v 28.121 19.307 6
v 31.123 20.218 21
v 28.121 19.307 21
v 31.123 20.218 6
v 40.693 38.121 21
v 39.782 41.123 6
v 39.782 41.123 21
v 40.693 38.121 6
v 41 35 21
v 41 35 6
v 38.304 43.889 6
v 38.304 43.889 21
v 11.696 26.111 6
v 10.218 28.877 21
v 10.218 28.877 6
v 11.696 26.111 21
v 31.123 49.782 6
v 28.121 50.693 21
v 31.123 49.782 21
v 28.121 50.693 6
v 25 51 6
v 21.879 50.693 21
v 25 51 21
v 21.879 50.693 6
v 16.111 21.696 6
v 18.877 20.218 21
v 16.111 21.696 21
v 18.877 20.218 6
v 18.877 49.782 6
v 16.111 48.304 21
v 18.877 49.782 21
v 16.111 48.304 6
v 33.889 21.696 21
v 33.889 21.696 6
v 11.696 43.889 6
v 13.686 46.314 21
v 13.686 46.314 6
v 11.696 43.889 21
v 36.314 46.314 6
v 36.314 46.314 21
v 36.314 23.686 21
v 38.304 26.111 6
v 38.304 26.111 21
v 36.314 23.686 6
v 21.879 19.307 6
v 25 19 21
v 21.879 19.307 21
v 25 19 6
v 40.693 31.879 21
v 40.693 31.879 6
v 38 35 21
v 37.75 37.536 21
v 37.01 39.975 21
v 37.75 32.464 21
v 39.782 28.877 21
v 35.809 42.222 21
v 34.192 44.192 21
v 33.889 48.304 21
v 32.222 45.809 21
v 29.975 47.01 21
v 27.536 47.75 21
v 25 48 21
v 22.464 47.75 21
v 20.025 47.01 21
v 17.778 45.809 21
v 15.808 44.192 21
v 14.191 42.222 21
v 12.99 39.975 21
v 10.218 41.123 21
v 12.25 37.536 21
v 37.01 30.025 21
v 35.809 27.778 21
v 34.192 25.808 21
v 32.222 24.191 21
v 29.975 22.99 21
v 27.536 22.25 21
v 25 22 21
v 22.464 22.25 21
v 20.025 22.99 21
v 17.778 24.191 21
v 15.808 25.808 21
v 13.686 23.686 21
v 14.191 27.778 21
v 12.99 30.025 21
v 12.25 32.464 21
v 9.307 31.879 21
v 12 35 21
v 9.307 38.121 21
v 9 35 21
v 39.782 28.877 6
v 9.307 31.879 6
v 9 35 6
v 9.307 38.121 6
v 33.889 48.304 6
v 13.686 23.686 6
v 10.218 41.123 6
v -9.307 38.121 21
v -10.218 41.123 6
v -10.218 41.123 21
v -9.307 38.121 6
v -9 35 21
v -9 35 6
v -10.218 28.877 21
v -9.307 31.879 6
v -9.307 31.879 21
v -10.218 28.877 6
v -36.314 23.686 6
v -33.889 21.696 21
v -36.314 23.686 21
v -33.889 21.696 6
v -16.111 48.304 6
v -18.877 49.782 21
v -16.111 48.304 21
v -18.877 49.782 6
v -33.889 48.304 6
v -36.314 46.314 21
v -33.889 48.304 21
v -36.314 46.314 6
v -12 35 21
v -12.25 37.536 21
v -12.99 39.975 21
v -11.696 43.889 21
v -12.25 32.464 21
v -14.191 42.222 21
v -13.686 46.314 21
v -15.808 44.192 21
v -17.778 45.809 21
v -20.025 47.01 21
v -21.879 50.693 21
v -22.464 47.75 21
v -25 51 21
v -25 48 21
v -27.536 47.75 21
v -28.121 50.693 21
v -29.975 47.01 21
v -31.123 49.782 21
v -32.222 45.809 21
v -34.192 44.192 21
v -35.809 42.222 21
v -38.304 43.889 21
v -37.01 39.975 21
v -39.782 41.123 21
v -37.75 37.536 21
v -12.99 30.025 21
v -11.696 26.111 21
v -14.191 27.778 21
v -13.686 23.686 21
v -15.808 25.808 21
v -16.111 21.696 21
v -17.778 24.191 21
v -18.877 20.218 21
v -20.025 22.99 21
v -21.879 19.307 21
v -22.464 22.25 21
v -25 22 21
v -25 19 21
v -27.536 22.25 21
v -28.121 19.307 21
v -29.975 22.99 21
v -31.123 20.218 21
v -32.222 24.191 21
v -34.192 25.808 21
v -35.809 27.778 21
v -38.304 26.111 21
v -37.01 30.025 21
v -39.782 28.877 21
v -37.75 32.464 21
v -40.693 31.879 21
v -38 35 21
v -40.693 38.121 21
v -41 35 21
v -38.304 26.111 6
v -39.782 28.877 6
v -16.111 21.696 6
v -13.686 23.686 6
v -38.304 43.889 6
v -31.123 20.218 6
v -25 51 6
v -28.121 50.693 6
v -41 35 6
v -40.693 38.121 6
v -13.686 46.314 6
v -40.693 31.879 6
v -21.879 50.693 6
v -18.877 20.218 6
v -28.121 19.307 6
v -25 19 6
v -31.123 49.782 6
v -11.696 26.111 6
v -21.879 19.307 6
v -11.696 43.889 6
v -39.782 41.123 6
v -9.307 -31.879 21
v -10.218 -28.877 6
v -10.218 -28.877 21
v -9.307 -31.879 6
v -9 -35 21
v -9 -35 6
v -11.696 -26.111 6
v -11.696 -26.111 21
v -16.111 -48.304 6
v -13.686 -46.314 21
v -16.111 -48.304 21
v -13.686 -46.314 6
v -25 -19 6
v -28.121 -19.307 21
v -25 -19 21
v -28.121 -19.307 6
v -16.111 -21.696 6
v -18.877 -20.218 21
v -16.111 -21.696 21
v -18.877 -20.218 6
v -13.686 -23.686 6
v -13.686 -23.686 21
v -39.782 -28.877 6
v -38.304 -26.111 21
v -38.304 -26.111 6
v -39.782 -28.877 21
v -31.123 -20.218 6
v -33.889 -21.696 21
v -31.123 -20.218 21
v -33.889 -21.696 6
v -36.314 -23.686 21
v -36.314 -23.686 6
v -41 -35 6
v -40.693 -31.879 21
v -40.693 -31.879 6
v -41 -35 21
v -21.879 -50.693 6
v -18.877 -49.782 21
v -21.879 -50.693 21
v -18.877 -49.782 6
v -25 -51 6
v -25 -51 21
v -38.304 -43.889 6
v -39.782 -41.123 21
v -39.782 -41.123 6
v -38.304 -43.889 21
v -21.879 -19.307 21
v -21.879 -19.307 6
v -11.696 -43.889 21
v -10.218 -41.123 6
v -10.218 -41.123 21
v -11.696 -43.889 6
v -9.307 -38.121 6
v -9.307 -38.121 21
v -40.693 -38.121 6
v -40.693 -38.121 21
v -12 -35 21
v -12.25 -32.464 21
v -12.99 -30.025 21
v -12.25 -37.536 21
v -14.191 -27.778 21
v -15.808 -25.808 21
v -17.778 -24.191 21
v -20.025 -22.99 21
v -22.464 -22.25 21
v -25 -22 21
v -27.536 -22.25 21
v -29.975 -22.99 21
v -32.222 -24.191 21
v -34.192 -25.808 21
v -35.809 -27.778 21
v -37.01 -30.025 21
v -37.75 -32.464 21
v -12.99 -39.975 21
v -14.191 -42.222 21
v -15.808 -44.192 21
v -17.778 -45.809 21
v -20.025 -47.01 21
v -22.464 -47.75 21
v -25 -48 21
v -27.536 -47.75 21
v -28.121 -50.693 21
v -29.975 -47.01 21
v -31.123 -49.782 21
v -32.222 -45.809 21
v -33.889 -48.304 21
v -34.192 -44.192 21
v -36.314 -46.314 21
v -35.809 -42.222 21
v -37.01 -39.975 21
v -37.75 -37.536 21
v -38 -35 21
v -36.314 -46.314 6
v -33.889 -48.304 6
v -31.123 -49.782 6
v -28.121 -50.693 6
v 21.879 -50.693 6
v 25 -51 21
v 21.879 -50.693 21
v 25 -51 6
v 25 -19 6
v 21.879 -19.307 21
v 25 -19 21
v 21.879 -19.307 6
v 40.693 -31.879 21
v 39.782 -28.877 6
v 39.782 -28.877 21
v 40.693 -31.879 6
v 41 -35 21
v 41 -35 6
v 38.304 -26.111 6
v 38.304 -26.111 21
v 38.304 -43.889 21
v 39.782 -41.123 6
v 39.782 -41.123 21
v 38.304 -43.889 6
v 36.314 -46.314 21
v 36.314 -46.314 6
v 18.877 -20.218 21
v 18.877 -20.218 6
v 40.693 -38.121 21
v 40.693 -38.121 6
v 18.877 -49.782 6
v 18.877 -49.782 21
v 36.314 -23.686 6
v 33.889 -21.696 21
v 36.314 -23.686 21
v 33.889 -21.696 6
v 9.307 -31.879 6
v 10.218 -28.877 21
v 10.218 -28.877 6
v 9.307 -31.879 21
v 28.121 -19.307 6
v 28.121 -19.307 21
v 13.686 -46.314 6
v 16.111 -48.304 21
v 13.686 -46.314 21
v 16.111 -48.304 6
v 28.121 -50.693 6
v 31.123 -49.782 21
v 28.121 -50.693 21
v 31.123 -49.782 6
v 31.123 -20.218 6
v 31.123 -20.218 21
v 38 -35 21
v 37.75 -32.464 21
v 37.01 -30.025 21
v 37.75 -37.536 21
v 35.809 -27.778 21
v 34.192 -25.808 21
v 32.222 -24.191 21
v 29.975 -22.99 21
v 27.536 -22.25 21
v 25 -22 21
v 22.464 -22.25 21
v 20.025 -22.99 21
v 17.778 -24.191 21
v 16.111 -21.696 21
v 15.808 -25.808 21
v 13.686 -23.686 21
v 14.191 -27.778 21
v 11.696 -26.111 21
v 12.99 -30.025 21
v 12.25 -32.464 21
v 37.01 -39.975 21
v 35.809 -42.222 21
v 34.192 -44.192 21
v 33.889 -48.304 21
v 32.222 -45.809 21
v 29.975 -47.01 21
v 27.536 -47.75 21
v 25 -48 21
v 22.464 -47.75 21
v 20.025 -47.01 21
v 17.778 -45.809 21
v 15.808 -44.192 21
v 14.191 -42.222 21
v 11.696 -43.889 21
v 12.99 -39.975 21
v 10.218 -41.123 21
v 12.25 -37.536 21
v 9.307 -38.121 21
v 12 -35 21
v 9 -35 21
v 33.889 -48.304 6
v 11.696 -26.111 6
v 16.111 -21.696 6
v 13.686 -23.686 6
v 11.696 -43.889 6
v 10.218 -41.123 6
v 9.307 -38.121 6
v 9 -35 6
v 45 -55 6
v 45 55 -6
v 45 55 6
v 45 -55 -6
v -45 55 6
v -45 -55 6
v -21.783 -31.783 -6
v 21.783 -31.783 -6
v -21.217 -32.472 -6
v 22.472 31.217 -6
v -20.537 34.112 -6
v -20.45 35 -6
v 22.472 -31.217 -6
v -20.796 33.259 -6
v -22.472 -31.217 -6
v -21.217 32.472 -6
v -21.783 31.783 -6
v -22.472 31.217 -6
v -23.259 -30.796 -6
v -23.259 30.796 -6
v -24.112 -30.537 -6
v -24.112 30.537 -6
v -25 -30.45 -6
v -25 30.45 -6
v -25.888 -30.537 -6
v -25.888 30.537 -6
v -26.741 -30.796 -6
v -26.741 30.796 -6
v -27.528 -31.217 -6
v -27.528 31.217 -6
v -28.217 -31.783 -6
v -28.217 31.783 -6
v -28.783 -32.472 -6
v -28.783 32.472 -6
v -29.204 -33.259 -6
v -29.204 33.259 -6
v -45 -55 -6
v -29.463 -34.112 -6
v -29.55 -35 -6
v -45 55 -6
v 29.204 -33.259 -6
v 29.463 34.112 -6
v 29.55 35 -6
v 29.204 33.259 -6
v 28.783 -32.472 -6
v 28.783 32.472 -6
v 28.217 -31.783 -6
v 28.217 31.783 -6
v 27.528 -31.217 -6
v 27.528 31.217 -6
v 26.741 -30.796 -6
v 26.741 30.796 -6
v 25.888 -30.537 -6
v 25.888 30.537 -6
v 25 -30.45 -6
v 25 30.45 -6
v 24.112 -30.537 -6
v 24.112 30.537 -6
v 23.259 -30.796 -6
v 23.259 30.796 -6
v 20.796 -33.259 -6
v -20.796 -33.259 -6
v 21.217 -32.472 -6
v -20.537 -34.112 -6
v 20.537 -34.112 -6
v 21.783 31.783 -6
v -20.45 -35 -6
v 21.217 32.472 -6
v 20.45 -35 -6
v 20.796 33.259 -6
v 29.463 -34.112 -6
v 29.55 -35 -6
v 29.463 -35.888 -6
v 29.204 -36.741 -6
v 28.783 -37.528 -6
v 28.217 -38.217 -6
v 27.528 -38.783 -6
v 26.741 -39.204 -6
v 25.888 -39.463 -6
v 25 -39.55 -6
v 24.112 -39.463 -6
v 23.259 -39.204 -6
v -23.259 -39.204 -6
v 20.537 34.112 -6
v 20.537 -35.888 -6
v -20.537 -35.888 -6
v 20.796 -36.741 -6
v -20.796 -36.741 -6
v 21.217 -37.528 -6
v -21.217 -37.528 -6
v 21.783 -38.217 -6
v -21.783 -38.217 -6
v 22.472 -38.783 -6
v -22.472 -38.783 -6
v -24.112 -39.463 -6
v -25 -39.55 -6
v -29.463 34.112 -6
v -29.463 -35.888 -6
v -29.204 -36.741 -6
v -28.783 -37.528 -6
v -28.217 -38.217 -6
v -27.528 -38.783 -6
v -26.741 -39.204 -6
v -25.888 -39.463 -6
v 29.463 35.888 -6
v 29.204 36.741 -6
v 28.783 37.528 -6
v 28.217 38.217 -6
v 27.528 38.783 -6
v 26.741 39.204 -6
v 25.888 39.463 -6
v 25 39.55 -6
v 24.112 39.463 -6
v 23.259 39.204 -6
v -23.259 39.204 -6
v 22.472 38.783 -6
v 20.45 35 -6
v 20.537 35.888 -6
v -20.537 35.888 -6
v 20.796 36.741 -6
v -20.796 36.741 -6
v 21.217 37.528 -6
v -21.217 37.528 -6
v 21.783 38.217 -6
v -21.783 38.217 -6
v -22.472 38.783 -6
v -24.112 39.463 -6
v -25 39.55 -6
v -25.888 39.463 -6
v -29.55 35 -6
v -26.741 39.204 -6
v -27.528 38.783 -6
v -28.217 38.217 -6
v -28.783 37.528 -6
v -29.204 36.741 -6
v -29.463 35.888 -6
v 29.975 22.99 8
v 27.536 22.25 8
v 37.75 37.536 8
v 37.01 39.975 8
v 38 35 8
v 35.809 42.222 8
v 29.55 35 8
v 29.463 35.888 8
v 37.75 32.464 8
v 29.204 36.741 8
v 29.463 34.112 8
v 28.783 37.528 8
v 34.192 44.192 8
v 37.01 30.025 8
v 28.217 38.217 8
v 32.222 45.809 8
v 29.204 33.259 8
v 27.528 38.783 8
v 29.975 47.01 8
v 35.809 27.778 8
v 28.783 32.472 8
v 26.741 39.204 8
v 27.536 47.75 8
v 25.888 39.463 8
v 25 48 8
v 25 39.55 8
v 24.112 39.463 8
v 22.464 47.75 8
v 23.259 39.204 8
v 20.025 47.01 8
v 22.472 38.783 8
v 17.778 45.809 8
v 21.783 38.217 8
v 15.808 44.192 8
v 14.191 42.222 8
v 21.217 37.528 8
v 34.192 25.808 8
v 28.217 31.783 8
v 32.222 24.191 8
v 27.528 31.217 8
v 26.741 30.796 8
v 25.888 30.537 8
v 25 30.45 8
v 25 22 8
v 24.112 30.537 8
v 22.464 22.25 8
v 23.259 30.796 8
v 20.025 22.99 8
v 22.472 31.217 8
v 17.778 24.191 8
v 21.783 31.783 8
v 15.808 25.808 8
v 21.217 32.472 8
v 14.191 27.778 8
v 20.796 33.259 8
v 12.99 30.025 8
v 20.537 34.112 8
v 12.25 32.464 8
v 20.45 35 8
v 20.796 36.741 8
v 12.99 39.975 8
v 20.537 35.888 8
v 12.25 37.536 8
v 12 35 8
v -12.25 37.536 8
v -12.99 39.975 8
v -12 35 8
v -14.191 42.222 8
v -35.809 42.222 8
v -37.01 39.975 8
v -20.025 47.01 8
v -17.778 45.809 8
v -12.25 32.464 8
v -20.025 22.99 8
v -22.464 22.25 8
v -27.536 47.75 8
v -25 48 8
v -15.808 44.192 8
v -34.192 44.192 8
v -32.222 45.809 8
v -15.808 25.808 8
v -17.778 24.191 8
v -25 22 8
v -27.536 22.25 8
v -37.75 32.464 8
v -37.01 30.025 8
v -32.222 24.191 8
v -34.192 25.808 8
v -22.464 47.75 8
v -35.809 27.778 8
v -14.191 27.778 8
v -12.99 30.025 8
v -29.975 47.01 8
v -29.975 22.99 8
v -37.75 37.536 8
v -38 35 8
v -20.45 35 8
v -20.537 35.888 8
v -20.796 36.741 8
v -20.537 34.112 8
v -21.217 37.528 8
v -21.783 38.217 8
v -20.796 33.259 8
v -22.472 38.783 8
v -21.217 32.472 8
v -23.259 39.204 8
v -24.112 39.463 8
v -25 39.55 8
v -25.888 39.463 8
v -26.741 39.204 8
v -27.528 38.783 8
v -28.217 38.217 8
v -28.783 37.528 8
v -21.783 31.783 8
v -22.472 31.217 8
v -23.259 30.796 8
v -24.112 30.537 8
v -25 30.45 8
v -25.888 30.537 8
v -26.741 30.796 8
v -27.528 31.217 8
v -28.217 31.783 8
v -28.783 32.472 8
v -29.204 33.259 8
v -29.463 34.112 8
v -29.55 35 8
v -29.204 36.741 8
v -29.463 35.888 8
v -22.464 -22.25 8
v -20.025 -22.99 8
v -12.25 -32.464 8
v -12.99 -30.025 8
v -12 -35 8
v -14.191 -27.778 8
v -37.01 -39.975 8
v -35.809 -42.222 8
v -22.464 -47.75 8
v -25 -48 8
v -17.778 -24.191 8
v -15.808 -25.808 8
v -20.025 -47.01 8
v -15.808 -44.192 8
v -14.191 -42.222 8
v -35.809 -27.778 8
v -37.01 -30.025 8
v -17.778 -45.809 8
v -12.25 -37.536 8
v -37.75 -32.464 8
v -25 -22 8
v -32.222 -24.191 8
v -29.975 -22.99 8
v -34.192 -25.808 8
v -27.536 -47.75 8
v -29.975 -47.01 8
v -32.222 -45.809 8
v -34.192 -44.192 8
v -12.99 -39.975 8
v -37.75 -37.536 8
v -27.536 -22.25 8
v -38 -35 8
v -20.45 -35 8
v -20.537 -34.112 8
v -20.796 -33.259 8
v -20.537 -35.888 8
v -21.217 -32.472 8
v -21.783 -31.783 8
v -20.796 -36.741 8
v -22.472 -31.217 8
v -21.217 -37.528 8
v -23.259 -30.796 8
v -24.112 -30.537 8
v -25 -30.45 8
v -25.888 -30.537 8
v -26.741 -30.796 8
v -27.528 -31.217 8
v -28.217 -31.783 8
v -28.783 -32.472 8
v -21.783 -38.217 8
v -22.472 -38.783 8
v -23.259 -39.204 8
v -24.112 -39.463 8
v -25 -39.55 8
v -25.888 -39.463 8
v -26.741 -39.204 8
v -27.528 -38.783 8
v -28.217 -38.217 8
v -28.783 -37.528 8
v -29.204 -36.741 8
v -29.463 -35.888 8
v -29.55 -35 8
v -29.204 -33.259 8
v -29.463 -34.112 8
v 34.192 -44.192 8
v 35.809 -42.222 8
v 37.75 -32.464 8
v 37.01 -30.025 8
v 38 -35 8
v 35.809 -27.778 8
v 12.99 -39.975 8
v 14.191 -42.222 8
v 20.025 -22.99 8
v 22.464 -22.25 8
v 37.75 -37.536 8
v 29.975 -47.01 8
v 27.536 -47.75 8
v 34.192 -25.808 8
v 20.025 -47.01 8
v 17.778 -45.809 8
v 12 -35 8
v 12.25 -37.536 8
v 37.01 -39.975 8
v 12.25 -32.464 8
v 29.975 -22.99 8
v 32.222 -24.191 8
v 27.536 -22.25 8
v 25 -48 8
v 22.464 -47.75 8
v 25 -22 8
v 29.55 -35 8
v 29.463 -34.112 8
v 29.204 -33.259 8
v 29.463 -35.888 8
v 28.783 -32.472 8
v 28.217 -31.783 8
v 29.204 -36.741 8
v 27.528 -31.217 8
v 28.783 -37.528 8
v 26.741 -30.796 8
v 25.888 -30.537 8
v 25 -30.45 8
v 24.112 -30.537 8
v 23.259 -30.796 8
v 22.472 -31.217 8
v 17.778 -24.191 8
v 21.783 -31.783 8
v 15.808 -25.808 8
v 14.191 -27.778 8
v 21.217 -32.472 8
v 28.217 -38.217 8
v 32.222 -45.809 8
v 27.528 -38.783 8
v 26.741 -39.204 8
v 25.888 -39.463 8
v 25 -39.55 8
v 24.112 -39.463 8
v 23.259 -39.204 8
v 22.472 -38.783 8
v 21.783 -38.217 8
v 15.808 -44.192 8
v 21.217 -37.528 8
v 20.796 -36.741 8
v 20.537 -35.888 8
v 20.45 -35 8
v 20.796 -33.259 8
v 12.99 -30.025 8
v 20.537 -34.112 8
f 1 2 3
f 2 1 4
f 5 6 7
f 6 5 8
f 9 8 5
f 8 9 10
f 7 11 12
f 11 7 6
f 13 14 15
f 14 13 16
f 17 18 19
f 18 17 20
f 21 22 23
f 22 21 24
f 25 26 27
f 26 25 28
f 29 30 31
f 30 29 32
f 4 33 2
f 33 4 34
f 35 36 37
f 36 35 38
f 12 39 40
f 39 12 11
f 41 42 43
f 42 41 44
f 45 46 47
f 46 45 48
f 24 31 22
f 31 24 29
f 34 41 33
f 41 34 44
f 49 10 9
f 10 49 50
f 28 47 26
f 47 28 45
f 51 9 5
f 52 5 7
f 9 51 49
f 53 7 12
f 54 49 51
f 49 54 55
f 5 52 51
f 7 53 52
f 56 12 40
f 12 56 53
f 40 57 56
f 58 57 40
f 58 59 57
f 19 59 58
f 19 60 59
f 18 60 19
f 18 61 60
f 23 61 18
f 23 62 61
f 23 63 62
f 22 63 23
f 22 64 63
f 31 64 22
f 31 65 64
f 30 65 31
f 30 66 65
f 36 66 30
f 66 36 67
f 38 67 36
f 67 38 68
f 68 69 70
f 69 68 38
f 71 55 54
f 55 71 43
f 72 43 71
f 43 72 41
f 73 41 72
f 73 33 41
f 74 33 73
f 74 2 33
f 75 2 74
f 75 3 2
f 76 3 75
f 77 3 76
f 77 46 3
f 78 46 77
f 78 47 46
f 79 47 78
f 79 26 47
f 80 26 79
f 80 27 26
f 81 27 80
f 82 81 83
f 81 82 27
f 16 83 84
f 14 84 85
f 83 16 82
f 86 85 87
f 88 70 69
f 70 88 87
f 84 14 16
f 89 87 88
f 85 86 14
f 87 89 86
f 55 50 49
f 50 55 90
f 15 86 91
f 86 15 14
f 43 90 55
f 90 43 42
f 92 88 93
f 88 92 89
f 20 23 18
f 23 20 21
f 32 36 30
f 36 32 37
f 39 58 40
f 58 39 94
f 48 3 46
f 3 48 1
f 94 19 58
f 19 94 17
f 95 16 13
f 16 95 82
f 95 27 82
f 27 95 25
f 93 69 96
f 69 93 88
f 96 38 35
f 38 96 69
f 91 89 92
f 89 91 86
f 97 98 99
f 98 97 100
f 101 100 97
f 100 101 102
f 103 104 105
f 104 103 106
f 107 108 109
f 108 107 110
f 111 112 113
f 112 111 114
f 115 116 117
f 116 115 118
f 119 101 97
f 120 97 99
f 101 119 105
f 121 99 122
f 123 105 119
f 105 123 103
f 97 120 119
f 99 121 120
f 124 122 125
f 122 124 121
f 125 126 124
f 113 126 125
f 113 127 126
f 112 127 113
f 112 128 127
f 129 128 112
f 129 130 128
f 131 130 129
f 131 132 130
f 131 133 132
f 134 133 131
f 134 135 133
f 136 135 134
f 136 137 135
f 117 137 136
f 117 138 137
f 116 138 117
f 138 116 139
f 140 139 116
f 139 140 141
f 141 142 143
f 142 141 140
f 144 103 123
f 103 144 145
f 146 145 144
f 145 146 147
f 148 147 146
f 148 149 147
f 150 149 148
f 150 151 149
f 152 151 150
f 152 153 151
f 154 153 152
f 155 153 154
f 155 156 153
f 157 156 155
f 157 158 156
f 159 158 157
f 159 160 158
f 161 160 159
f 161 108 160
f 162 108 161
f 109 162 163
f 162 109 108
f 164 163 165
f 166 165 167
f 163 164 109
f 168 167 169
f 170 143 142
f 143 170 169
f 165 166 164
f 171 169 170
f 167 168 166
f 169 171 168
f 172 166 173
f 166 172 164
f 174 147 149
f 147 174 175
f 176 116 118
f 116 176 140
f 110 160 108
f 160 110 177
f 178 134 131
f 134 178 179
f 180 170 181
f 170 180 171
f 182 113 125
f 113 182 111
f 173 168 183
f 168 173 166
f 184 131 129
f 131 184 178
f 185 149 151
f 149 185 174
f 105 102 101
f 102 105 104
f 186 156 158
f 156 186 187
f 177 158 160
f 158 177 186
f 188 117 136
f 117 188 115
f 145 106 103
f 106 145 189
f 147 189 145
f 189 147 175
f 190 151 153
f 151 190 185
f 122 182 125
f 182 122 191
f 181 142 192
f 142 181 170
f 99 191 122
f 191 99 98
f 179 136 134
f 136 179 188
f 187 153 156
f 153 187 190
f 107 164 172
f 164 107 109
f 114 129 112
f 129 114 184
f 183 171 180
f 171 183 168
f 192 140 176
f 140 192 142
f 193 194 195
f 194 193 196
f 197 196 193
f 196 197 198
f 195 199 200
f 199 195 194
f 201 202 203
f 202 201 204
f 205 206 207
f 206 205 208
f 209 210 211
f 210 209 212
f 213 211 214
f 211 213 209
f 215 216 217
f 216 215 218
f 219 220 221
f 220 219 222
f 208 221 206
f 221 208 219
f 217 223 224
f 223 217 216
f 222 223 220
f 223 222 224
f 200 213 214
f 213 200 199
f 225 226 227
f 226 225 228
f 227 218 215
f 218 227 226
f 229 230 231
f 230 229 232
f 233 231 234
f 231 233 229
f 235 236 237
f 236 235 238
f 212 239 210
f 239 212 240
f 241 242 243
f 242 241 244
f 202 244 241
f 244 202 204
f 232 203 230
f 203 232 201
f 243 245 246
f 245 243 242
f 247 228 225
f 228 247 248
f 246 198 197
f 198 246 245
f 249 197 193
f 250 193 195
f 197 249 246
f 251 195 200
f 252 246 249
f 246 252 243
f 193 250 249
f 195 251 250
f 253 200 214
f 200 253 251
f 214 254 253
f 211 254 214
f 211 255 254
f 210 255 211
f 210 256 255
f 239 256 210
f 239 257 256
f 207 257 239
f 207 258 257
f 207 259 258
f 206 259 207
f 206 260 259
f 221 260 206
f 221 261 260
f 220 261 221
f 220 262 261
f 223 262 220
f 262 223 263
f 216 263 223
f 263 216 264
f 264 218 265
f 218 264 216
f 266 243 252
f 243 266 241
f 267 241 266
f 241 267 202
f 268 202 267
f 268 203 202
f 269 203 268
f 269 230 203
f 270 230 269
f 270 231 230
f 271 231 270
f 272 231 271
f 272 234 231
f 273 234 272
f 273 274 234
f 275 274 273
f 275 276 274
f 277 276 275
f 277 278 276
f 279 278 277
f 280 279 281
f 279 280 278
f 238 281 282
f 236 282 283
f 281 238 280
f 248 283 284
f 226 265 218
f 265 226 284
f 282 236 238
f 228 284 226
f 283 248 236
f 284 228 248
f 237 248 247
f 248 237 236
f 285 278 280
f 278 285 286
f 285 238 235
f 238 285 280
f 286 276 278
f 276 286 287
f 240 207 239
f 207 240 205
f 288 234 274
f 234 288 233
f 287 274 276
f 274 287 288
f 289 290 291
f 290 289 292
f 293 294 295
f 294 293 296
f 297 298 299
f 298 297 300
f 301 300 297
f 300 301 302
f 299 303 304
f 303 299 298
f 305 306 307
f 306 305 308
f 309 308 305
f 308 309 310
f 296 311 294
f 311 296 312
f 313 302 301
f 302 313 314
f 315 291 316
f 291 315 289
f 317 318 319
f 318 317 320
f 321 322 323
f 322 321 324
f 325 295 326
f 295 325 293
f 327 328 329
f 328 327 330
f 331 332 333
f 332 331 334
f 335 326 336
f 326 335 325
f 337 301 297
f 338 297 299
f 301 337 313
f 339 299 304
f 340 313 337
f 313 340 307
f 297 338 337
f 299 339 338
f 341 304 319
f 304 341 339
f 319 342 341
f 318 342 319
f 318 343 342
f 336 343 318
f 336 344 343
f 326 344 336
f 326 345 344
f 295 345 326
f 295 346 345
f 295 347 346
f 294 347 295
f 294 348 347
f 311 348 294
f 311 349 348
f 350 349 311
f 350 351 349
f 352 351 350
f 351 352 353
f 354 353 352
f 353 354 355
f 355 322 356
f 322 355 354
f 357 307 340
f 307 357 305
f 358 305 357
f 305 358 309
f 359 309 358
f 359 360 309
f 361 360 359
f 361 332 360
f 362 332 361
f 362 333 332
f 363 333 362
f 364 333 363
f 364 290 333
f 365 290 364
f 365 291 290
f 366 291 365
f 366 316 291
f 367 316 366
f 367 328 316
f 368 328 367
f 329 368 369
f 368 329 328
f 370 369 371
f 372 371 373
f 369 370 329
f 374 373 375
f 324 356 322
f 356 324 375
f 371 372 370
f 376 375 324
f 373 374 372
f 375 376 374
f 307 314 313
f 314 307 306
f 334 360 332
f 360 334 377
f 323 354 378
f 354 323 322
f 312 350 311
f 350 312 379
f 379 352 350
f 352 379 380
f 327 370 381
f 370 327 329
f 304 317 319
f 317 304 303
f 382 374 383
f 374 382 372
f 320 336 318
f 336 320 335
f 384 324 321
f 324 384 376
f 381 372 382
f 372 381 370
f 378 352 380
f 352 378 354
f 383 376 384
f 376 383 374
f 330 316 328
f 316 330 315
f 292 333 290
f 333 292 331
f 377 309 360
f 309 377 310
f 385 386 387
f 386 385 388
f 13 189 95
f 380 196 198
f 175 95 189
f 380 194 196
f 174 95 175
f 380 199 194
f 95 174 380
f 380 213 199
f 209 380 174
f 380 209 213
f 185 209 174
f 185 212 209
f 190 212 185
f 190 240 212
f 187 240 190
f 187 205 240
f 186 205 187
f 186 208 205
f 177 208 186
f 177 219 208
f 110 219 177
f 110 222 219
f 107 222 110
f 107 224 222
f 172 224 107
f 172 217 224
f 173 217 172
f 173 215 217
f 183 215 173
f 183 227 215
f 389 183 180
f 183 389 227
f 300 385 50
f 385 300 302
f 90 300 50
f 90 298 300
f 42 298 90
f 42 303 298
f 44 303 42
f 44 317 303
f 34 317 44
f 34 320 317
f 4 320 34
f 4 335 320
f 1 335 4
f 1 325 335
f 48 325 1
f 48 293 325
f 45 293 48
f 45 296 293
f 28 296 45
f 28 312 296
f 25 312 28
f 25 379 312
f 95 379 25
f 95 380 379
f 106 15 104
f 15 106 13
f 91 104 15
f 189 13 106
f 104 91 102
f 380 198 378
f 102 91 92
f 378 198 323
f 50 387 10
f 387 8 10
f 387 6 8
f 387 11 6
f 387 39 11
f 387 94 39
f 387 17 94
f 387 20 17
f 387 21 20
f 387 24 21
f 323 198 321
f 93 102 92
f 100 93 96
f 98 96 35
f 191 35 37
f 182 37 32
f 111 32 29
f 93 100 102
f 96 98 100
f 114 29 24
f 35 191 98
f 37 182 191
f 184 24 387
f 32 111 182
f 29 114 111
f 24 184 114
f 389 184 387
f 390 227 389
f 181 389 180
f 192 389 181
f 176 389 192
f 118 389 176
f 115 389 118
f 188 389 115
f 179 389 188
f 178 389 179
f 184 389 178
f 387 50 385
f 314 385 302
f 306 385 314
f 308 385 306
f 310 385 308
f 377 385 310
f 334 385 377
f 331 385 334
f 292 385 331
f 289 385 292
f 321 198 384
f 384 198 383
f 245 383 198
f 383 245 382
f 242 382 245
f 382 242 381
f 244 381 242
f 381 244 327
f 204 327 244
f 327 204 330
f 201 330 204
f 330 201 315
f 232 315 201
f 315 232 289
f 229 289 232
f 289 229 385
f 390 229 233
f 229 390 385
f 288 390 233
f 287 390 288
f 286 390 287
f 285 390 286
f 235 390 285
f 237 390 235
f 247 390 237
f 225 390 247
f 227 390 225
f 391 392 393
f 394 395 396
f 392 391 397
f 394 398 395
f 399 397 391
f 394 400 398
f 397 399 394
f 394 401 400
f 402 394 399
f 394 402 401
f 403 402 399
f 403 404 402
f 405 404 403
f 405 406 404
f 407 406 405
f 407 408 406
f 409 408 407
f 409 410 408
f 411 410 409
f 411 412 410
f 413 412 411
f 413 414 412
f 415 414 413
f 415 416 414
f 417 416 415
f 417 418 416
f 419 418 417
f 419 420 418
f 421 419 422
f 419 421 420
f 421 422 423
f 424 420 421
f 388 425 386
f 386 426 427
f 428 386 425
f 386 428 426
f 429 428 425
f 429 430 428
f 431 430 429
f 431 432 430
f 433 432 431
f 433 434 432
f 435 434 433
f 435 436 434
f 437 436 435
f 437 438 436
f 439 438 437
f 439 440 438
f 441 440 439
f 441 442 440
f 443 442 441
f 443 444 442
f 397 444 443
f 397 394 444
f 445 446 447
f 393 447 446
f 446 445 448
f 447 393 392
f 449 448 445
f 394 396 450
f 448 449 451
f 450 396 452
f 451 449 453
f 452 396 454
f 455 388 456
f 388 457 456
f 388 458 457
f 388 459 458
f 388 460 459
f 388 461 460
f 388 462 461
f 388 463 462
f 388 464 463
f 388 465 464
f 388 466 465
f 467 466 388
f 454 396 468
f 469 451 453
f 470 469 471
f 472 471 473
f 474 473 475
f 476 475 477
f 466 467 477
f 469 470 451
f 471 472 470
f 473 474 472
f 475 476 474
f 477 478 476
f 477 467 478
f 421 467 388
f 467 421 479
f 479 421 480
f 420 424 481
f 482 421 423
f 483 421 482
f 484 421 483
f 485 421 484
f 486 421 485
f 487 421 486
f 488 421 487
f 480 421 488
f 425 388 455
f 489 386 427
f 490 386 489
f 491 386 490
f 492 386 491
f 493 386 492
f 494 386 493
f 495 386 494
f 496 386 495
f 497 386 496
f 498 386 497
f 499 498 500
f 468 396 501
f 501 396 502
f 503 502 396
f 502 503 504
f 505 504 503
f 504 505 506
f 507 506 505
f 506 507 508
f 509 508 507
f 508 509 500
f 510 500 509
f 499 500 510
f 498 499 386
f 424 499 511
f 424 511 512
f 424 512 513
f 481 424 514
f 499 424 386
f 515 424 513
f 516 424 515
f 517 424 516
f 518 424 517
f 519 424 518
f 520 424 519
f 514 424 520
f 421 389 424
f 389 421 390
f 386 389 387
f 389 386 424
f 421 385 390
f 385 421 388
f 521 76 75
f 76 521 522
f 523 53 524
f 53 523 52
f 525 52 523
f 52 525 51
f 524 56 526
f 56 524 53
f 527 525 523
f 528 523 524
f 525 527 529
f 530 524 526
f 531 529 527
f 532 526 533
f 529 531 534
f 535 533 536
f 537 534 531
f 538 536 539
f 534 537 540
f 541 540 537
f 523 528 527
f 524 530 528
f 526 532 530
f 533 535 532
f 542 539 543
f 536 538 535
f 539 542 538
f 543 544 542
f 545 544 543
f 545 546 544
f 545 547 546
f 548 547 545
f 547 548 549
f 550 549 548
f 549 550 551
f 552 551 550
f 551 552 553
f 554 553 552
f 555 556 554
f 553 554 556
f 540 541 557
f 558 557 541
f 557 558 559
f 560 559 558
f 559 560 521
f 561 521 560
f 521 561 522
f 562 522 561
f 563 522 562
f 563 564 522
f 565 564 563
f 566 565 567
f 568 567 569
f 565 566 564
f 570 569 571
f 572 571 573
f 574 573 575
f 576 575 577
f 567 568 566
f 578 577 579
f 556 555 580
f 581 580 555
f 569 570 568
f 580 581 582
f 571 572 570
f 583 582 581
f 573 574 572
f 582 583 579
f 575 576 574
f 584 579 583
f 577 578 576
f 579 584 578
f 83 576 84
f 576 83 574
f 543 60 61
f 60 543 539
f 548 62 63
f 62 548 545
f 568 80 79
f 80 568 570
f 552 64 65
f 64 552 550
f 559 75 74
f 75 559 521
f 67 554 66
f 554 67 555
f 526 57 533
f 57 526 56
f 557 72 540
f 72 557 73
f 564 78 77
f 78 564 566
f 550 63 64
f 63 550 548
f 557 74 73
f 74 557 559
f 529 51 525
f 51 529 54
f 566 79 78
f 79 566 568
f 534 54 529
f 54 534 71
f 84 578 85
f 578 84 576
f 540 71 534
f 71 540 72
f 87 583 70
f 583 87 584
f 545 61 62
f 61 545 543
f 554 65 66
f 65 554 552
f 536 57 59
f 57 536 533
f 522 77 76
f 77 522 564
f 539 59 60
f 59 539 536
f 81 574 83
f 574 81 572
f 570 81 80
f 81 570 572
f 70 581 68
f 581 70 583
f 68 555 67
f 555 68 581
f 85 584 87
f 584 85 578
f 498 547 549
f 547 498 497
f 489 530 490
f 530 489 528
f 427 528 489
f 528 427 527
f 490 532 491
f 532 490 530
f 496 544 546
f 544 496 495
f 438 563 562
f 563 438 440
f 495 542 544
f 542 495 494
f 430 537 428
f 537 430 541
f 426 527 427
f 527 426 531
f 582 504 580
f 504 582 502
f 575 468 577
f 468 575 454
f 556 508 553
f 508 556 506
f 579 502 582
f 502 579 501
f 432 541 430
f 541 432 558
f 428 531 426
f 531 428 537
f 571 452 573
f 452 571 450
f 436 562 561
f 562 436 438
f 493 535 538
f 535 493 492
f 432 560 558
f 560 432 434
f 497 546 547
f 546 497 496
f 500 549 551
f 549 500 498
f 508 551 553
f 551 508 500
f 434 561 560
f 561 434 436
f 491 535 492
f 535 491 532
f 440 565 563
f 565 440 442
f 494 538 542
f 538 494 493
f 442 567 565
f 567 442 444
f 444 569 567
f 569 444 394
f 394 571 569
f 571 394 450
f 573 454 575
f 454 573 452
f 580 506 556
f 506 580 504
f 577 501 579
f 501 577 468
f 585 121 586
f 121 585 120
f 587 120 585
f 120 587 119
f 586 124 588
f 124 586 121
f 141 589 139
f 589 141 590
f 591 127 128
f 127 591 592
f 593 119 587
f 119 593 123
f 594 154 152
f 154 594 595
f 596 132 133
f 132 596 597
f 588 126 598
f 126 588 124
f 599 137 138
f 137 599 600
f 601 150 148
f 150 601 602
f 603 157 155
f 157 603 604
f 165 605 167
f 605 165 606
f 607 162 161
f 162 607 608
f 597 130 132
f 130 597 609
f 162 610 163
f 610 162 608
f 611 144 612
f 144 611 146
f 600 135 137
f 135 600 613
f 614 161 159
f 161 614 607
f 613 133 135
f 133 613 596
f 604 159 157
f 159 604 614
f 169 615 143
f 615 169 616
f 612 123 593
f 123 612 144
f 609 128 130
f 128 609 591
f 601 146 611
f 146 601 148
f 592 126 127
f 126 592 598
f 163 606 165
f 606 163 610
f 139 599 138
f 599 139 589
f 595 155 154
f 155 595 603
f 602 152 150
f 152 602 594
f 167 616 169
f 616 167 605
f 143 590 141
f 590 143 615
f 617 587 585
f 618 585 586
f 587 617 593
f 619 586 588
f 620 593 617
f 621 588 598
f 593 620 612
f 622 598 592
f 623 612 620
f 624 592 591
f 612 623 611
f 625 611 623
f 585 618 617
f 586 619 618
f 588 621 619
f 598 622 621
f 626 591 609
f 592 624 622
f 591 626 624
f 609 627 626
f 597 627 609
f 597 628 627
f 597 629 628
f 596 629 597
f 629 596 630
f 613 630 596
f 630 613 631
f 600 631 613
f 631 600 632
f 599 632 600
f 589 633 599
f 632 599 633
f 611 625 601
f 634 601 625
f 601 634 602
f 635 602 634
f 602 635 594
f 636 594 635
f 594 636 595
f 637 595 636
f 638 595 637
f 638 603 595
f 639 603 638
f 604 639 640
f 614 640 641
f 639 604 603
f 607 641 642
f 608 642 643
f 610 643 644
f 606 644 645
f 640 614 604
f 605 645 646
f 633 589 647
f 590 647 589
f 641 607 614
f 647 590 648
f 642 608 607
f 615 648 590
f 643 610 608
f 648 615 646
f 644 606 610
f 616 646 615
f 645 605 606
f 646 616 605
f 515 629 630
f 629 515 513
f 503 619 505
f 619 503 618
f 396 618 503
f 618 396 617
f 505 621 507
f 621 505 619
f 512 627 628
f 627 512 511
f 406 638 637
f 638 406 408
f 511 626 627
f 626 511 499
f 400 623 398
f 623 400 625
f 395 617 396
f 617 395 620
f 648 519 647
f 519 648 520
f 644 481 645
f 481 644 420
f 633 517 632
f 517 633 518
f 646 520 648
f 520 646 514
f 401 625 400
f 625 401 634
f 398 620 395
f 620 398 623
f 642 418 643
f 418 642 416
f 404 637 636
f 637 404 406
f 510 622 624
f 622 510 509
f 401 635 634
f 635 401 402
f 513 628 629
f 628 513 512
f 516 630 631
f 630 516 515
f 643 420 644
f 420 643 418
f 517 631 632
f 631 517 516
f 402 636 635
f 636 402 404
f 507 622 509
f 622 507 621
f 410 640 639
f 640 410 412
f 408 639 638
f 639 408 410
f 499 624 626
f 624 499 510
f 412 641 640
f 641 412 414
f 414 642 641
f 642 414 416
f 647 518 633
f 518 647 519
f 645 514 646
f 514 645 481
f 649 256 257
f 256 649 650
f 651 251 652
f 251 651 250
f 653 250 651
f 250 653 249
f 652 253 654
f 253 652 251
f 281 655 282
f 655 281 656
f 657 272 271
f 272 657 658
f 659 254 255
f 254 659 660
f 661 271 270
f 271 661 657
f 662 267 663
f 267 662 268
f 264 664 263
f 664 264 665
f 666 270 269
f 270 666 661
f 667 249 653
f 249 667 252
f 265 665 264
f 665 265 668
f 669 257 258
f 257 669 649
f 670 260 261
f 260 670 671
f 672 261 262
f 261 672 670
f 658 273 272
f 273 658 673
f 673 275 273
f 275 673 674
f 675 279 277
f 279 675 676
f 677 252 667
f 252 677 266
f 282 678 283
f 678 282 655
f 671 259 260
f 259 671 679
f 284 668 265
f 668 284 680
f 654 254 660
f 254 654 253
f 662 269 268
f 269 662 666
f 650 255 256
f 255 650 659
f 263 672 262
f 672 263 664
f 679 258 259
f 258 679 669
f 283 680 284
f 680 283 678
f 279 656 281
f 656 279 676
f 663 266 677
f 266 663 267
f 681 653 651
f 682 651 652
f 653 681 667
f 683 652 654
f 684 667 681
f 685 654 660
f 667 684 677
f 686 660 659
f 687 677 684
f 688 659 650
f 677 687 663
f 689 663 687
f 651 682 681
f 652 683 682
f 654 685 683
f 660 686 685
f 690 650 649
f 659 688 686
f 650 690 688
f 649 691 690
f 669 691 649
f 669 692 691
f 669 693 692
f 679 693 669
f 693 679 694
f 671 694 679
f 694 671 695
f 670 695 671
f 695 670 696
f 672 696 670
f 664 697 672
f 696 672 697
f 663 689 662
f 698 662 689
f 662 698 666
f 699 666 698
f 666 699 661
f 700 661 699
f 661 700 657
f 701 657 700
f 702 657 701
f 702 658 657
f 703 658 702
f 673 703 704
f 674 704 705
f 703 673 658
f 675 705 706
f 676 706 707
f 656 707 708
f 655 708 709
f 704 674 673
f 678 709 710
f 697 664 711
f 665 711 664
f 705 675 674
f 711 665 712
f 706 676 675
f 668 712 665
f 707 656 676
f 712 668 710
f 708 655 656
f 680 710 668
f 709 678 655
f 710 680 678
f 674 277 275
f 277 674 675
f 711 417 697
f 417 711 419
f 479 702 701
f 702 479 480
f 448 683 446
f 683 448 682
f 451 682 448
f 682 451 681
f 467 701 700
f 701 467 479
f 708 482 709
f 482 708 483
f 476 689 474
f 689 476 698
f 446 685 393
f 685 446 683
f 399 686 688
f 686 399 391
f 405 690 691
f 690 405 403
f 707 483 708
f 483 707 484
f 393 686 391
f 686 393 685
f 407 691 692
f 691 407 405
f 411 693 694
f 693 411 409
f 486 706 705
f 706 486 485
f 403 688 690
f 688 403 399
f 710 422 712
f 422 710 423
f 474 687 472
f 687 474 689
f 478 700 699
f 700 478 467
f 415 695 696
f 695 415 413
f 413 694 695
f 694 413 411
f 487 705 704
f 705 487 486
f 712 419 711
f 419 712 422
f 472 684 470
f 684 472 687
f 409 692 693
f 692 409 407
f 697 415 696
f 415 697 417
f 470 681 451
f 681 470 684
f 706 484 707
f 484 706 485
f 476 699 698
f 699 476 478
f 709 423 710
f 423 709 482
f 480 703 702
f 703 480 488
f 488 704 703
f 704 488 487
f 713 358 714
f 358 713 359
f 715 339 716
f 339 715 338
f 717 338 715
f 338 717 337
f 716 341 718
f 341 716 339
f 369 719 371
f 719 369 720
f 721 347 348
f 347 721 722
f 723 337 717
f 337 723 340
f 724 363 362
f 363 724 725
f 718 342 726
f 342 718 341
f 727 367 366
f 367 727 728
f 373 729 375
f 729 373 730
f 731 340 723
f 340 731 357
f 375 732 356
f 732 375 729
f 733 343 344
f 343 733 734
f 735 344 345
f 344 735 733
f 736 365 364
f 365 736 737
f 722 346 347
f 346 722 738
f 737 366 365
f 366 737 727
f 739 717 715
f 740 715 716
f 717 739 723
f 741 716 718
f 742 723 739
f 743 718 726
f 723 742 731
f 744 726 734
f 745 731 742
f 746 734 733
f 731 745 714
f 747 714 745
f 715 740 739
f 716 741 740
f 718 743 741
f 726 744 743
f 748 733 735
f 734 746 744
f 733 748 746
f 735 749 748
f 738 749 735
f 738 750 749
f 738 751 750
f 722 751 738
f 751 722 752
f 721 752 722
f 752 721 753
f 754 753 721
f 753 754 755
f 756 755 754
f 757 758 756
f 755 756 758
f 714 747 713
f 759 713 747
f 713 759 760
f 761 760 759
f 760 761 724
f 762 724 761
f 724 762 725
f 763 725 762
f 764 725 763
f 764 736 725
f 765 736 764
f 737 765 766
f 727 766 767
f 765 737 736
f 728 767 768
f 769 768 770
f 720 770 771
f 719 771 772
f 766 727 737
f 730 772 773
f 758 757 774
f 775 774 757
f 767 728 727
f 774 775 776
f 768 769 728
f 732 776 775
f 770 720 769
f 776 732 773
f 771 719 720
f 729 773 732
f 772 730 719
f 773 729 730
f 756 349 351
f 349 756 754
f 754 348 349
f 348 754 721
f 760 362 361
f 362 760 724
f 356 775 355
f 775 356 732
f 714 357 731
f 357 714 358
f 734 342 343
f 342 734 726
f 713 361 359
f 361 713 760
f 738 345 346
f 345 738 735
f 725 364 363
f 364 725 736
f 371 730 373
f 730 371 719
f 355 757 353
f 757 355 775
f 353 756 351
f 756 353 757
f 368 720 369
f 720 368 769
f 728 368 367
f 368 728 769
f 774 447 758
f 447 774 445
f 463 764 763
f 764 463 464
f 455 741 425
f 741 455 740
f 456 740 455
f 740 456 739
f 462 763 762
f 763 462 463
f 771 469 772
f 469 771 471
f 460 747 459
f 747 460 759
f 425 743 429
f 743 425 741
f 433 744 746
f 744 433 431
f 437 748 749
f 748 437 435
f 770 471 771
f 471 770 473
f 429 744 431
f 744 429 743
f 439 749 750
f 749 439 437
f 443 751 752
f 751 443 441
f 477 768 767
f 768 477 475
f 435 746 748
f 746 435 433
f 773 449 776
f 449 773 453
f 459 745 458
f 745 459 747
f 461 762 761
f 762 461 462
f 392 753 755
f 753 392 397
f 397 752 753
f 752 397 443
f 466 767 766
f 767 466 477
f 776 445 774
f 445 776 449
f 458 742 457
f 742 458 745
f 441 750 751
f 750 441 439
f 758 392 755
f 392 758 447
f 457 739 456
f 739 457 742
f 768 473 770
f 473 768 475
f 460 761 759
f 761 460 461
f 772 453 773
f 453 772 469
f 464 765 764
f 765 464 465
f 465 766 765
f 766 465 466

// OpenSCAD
$fn = 32;

// ----------------------------------------------------------------------
// Socket pad plate
// bosses with counterbored sockets for the screws
// ----------------------------------------------------------------------

// --- parameters (mm) ---
base_t = 12;            // base plate thickness
boss_h = 15;            // boss height above the base plate
boss_d = 32;            // boss diameter
socket_d = 26;          // socket diameter
socket_depth = 13;      // socket depth from the boss face
bolt_d = 9.1;           // screw clearance hole through the socket floor
plate = [90, 110, 12];  // overall size (x, y, z)
edge = 20;              // boss centre offset from the plate edge
pads = 4;               // boss count, one per corner

// --- derived feature positions (mm) ---
height = base_t + boss_h;        // = 27   overall height of the part
corner_x = plate[0] / 2 - edge;  // = 25   boss centre X
corner_y = plate[1] / 2 - edge;  // = 35   boss centre Y
feature_centers = [
  [corner_x, corner_y],
  [-corner_x, corner_y],
  [-corner_x, -corner_y],
  [corner_x, -corner_y]
];   // boss centres: sockets, holes and the pads themselves are placed from here

// base plate, bosses on feature_centers, socket + through hole in each
difference() {
  union() {
    cube(plate, center = true);
    for (centre = feature_centers)
      translate([centre[0], centre[1], plate[2] / 2 - 1])
        cylinder(d = boss_d, h = boss_h + 1);
  }
  for (centre = feature_centers) {
    translate([centre[0], centre[1], plate[2] / 2 + boss_h - socket_depth])
      cylinder(d = socket_d, h = socket_depth + 1);
    translate([centre[0], centre[1], -height])
      cylinder(d = bolt_d, h = 2 * height + 2);  // through the socket floor
  }
}
